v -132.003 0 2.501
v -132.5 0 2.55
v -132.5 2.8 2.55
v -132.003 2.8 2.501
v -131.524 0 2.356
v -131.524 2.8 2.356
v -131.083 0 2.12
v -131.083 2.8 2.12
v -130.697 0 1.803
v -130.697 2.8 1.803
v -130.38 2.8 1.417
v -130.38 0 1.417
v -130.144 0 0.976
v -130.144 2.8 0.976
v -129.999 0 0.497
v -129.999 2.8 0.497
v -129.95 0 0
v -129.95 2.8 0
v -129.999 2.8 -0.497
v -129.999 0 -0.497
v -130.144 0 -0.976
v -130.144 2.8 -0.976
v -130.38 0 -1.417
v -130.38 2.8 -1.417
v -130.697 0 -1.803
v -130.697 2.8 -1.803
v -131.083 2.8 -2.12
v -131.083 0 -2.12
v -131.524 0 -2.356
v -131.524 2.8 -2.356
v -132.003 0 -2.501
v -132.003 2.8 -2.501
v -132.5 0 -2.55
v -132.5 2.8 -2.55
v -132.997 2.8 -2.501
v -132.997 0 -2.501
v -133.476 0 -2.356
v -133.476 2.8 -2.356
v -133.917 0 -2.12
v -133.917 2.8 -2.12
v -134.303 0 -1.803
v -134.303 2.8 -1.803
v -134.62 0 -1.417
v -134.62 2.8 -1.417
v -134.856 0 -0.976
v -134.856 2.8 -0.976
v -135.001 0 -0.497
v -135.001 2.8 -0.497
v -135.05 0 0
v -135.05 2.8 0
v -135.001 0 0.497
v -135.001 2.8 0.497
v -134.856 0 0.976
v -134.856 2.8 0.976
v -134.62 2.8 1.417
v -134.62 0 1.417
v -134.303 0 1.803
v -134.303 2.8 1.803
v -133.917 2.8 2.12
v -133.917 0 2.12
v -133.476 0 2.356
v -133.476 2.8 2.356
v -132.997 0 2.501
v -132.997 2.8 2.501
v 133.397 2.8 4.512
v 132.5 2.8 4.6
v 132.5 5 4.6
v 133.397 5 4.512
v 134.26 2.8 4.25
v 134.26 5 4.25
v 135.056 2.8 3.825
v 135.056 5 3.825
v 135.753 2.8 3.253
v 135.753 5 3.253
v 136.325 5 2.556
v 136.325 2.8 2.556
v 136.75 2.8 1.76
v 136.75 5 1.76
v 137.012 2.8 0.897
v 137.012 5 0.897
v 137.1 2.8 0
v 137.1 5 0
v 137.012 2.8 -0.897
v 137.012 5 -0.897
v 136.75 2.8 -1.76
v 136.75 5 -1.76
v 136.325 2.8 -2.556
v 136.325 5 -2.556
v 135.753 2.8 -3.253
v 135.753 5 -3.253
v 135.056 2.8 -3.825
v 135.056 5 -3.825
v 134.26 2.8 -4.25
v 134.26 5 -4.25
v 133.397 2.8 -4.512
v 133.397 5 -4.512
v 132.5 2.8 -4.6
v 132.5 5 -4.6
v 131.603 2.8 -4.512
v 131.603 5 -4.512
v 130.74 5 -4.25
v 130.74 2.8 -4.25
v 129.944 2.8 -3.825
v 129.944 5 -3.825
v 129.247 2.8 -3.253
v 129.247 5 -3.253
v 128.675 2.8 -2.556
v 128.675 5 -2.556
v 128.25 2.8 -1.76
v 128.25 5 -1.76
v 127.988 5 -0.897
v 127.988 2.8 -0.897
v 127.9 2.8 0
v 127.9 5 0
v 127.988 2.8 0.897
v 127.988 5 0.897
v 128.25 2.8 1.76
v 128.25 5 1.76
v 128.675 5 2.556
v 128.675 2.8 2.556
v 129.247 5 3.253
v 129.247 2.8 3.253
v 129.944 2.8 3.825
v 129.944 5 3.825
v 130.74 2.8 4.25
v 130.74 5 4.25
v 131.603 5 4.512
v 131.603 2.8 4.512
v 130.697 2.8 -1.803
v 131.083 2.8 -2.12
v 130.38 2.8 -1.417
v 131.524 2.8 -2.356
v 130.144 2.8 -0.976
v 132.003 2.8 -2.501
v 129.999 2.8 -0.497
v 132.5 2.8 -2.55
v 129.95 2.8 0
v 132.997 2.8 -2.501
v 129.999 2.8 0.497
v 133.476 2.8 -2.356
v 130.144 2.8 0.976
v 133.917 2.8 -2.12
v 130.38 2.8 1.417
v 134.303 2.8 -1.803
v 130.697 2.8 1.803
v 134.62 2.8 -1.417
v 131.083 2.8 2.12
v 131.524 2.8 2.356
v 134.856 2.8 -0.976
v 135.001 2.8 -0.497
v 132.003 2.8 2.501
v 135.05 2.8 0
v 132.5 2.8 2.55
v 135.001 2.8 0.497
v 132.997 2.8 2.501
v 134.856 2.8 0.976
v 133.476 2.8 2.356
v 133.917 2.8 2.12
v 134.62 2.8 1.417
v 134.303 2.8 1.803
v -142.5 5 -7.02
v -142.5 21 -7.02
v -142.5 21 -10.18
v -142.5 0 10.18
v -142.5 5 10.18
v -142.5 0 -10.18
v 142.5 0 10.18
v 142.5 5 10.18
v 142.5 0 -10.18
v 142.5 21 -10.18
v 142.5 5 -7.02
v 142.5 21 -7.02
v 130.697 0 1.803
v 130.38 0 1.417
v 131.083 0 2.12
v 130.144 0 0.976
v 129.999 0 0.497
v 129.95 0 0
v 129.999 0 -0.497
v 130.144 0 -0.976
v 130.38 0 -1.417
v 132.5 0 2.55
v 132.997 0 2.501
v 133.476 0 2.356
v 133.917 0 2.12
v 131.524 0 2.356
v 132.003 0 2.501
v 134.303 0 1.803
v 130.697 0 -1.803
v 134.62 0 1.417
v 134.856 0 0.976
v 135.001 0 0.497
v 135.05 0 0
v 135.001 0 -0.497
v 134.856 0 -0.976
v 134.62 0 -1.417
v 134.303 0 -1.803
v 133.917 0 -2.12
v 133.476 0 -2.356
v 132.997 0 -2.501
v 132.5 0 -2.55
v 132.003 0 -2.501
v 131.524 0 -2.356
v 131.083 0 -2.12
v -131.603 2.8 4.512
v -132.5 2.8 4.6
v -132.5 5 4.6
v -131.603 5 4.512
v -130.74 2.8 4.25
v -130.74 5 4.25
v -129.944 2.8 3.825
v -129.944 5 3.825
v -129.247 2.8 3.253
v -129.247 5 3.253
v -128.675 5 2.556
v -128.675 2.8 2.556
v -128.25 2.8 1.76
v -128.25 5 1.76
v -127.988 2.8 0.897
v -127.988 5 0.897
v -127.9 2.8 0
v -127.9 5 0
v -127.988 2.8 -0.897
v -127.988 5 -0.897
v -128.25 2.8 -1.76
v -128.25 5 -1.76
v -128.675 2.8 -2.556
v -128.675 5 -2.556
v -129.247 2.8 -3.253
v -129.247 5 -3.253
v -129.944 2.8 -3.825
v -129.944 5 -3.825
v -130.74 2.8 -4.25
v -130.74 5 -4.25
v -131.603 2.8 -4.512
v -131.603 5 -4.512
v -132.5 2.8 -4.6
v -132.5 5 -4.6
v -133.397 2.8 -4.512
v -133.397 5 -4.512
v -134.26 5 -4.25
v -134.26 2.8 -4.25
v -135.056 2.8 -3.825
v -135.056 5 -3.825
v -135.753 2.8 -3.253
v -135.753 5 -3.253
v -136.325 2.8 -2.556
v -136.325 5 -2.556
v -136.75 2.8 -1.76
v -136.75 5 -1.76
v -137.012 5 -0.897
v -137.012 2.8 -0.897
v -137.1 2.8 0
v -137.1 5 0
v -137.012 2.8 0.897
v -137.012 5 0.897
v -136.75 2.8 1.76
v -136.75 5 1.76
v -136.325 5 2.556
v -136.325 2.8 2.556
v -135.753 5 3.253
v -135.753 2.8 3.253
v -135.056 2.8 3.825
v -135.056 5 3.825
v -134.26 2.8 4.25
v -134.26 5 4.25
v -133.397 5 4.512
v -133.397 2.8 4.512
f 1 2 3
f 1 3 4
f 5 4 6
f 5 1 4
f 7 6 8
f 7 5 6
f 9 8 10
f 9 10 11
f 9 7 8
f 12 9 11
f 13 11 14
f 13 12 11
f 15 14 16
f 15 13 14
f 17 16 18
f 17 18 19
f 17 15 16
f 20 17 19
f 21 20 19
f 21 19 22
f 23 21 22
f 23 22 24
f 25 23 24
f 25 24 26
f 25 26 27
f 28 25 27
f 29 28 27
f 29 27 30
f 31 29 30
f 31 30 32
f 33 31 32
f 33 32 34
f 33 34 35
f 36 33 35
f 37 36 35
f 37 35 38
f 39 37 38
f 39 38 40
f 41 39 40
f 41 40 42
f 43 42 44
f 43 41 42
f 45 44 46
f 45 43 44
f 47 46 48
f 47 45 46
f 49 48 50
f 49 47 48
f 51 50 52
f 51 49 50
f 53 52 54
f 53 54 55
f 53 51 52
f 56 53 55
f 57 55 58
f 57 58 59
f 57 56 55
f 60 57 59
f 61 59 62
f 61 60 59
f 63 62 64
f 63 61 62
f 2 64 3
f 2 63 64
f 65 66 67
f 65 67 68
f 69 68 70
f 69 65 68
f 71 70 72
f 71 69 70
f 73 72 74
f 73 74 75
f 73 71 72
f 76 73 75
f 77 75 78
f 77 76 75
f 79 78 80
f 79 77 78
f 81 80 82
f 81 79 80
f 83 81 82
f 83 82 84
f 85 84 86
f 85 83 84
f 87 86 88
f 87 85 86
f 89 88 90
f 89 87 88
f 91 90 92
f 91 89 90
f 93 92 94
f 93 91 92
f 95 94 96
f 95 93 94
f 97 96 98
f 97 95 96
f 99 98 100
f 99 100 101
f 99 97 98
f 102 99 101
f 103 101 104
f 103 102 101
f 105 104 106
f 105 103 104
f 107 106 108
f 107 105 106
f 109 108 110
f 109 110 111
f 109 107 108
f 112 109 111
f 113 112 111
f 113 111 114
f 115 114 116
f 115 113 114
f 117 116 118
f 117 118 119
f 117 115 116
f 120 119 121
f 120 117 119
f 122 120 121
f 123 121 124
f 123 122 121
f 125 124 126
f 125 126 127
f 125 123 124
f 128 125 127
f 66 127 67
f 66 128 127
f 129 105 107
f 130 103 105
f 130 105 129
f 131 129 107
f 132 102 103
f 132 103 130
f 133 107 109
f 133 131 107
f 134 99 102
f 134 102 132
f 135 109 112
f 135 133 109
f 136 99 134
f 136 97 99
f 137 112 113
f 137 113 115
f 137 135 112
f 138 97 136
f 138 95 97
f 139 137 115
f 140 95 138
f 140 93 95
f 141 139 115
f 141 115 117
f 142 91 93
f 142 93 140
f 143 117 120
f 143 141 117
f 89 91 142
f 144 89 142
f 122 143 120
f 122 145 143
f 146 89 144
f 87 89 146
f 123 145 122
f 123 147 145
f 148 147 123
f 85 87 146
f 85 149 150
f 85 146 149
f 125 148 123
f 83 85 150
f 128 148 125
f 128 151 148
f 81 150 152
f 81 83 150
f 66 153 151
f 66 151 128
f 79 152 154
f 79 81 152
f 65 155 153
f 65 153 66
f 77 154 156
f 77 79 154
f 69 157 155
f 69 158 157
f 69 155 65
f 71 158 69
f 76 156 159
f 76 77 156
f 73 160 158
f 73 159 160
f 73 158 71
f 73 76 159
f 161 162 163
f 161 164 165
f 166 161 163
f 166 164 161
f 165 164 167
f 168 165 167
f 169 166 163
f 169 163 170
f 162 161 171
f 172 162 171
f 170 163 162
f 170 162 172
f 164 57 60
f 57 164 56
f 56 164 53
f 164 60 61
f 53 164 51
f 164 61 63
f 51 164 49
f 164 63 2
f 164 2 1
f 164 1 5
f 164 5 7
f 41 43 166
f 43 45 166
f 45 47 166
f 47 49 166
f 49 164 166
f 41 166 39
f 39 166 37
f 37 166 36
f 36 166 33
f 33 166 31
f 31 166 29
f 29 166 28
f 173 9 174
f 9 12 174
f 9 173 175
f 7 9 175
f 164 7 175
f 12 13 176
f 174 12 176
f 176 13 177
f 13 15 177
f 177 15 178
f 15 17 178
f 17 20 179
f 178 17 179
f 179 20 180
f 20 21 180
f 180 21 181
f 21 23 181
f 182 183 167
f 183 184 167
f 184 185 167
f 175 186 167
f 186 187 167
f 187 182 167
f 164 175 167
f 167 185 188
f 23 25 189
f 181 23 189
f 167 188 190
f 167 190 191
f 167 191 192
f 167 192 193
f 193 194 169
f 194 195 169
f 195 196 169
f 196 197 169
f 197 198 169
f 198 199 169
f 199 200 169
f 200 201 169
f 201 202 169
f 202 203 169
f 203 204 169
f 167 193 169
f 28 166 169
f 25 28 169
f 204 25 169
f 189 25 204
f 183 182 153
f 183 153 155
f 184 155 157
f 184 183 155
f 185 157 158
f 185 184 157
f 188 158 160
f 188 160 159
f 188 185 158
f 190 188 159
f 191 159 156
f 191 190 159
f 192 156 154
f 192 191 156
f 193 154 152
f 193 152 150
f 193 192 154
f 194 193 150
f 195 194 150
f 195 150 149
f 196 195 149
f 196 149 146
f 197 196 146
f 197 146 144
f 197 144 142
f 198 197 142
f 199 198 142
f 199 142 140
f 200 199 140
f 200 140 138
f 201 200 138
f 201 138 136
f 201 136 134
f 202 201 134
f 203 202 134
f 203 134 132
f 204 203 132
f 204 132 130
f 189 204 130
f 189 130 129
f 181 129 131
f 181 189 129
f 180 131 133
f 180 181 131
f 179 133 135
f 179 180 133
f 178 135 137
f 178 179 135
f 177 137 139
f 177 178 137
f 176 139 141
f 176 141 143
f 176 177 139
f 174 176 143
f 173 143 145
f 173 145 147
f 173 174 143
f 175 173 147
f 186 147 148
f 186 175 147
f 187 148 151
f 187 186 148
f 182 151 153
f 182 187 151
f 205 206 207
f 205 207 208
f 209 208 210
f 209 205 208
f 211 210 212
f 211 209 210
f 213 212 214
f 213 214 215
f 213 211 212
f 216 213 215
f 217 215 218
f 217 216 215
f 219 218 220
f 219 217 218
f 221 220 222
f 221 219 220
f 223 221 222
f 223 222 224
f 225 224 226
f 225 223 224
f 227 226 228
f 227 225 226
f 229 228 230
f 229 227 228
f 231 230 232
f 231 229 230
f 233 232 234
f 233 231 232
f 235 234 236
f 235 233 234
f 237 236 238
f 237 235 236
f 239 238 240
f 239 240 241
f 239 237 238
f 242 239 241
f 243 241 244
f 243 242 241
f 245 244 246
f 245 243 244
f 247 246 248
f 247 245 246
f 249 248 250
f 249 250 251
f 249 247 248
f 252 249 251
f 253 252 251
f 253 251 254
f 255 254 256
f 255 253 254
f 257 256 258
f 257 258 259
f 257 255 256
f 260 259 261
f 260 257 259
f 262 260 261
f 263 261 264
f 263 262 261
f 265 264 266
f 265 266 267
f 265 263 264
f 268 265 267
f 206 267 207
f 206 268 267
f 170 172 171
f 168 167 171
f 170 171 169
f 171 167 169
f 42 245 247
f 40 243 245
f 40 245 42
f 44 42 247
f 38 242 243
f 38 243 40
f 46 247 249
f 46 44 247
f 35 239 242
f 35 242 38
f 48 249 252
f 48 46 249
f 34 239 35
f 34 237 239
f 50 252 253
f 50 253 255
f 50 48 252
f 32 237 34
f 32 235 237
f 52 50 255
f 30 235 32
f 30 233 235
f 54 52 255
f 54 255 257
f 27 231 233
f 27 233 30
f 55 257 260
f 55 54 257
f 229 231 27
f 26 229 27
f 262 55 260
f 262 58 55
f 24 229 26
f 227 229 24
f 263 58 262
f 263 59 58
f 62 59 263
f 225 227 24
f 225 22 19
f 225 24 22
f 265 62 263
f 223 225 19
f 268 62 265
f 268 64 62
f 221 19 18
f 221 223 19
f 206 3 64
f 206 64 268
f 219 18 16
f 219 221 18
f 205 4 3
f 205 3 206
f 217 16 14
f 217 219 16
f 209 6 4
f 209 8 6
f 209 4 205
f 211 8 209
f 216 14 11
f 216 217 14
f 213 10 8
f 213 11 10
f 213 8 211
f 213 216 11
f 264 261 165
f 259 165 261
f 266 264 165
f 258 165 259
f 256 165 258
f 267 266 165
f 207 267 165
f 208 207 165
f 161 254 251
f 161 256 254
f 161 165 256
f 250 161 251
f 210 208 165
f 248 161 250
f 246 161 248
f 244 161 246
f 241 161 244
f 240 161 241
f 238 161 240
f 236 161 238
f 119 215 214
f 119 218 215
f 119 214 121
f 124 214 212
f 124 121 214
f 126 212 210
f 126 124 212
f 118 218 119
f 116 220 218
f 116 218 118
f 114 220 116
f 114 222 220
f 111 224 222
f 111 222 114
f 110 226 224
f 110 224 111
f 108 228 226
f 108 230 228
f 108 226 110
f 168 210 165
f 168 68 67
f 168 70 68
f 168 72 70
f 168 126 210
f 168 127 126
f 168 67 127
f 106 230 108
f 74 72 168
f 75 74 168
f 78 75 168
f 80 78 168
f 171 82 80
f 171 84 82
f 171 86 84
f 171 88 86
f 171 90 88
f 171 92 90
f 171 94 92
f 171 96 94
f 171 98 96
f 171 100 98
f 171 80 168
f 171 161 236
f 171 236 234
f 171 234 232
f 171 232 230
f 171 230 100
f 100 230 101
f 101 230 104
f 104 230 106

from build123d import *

# Parameters (mm, degrees)
SKETCH1_W           = 285
SKETCH1_H           = 17.2
SKETCH1_R           = 4.6
SKETCH1_H_2         = 3.16
SKETCH1_R_2         = 2.55
BOSS_EXTRUDE1_DEPTH = 5
BOSS_EXTRUDE2_START = 5
SKETCH1_3_W         = 285
SKETCH1_3_H         = 3.16
BOSS_EXTRUDE2_DEPTH = 16
CUT_EXTRUDE1_START  = 2.8
SKETCH1_5_R         = 4.6
SKETCH1_5_R_2       = 2.55
CUT_EXTRUDE1_DEPTH  = 2.2


with BuildPart() as part:
    # Sketch1 → Boss-Extrude1 (new body)
    # profile 1 of 4: a face of its own
    with BuildSketch(Plane(origin=(0, 0, 0), x_dir=(1, 0, 0), z_dir=(0, 1, 0))):
        with Locations((0, -1.58)):
            Rectangle(SKETCH1_W, SKETCH1_H)
        with Locations((-132.5, 0)):
            Circle(SKETCH1_R, mode=Mode.SUBTRACT)
        with Locations((132.5, 0)):
            Circle(SKETCH1_R, mode=Mode.SUBTRACT)
    # profile 2 of 4: a face of its own
    with BuildSketch(Plane(origin=(0, 0, 0), x_dir=(1, 0, 0), z_dir=(0, 1, 0))):
        with Locations((0, 8.6)):
            Rectangle(SKETCH1_W, SKETCH1_H_2)
    # profile 3 of 4: a face of its own
    with BuildSketch(Plane(origin=(0, 0, 0), x_dir=(1, 0, 0), z_dir=(0, 1, 0))):
        with Locations((-132.5, 0)):
            Circle(SKETCH1_R)
        with Locations(Location((-132.5, 0, 0), (0, 0, 270))):
            Circle(SKETCH1_R_2, mode=Mode.SUBTRACT)
    # profile 4 of 4: a face of its own
    with BuildSketch(Plane(origin=(0, 0, 0), x_dir=(1, 0, 0), z_dir=(0, 1, 0))):
        with Locations((132.5, 0)):
            Circle(SKETCH1_R)
        with Locations(Location((132.5, 0, 0), (0, 0, 270))):
            Circle(SKETCH1_R_2, mode=Mode.SUBTRACT)
    extrude(amount=BOSS_EXTRUDE1_DEPTH)

    # Sketch1<3> → Boss-Extrude2 (add)
    with BuildSketch(Plane(origin=(0, 0, 0), x_dir=(1, 0, 0), z_dir=(0, 1, 0)).offset(BOSS_EXTRUDE2_START)):
        with Locations((0, 8.6)):
            Rectangle(SKETCH1_3_W, SKETCH1_3_H)
    extrude(amount=BOSS_EXTRUDE2_DEPTH)

    # Sketch1<5> → Cut-Extrude1 (cut)
    # profile 1 of 2: a face of its own
    with BuildSketch(Plane(origin=(0, 0, 0), x_dir=(1, 0, 0), z_dir=(0, 1, 0)).offset(CUT_EXTRUDE1_START)):
        with Locations(Location((-132.5, 0, 0), (0, 0, 270))):
            Circle(SKETCH1_5_R)
        with Locations(Location((-132.5, 0, 0), (0, 0, 270))):
            Circle(SKETCH1_5_R_2, mode=Mode.SUBTRACT)
    # profile 2 of 2: a face of its own
    with BuildSketch(Plane(origin=(0, 0, 0), x_dir=(1, 0, 0), z_dir=(0, 1, 0)).offset(CUT_EXTRUDE1_START)):
        with Locations(Location((132.5, 0, 0), (0, 0, 270))):
            Circle(SKETCH1_5_R)
        with Locations(Location((132.5, 0, 0), (0, 0, 270))):
            Circle(SKETCH1_5_R_2, mode=Mode.SUBTRACT)
    extrude(amount=CUT_EXTRUDE1_DEPTH, mode=Mode.SUBTRACT)


solid = part.part
